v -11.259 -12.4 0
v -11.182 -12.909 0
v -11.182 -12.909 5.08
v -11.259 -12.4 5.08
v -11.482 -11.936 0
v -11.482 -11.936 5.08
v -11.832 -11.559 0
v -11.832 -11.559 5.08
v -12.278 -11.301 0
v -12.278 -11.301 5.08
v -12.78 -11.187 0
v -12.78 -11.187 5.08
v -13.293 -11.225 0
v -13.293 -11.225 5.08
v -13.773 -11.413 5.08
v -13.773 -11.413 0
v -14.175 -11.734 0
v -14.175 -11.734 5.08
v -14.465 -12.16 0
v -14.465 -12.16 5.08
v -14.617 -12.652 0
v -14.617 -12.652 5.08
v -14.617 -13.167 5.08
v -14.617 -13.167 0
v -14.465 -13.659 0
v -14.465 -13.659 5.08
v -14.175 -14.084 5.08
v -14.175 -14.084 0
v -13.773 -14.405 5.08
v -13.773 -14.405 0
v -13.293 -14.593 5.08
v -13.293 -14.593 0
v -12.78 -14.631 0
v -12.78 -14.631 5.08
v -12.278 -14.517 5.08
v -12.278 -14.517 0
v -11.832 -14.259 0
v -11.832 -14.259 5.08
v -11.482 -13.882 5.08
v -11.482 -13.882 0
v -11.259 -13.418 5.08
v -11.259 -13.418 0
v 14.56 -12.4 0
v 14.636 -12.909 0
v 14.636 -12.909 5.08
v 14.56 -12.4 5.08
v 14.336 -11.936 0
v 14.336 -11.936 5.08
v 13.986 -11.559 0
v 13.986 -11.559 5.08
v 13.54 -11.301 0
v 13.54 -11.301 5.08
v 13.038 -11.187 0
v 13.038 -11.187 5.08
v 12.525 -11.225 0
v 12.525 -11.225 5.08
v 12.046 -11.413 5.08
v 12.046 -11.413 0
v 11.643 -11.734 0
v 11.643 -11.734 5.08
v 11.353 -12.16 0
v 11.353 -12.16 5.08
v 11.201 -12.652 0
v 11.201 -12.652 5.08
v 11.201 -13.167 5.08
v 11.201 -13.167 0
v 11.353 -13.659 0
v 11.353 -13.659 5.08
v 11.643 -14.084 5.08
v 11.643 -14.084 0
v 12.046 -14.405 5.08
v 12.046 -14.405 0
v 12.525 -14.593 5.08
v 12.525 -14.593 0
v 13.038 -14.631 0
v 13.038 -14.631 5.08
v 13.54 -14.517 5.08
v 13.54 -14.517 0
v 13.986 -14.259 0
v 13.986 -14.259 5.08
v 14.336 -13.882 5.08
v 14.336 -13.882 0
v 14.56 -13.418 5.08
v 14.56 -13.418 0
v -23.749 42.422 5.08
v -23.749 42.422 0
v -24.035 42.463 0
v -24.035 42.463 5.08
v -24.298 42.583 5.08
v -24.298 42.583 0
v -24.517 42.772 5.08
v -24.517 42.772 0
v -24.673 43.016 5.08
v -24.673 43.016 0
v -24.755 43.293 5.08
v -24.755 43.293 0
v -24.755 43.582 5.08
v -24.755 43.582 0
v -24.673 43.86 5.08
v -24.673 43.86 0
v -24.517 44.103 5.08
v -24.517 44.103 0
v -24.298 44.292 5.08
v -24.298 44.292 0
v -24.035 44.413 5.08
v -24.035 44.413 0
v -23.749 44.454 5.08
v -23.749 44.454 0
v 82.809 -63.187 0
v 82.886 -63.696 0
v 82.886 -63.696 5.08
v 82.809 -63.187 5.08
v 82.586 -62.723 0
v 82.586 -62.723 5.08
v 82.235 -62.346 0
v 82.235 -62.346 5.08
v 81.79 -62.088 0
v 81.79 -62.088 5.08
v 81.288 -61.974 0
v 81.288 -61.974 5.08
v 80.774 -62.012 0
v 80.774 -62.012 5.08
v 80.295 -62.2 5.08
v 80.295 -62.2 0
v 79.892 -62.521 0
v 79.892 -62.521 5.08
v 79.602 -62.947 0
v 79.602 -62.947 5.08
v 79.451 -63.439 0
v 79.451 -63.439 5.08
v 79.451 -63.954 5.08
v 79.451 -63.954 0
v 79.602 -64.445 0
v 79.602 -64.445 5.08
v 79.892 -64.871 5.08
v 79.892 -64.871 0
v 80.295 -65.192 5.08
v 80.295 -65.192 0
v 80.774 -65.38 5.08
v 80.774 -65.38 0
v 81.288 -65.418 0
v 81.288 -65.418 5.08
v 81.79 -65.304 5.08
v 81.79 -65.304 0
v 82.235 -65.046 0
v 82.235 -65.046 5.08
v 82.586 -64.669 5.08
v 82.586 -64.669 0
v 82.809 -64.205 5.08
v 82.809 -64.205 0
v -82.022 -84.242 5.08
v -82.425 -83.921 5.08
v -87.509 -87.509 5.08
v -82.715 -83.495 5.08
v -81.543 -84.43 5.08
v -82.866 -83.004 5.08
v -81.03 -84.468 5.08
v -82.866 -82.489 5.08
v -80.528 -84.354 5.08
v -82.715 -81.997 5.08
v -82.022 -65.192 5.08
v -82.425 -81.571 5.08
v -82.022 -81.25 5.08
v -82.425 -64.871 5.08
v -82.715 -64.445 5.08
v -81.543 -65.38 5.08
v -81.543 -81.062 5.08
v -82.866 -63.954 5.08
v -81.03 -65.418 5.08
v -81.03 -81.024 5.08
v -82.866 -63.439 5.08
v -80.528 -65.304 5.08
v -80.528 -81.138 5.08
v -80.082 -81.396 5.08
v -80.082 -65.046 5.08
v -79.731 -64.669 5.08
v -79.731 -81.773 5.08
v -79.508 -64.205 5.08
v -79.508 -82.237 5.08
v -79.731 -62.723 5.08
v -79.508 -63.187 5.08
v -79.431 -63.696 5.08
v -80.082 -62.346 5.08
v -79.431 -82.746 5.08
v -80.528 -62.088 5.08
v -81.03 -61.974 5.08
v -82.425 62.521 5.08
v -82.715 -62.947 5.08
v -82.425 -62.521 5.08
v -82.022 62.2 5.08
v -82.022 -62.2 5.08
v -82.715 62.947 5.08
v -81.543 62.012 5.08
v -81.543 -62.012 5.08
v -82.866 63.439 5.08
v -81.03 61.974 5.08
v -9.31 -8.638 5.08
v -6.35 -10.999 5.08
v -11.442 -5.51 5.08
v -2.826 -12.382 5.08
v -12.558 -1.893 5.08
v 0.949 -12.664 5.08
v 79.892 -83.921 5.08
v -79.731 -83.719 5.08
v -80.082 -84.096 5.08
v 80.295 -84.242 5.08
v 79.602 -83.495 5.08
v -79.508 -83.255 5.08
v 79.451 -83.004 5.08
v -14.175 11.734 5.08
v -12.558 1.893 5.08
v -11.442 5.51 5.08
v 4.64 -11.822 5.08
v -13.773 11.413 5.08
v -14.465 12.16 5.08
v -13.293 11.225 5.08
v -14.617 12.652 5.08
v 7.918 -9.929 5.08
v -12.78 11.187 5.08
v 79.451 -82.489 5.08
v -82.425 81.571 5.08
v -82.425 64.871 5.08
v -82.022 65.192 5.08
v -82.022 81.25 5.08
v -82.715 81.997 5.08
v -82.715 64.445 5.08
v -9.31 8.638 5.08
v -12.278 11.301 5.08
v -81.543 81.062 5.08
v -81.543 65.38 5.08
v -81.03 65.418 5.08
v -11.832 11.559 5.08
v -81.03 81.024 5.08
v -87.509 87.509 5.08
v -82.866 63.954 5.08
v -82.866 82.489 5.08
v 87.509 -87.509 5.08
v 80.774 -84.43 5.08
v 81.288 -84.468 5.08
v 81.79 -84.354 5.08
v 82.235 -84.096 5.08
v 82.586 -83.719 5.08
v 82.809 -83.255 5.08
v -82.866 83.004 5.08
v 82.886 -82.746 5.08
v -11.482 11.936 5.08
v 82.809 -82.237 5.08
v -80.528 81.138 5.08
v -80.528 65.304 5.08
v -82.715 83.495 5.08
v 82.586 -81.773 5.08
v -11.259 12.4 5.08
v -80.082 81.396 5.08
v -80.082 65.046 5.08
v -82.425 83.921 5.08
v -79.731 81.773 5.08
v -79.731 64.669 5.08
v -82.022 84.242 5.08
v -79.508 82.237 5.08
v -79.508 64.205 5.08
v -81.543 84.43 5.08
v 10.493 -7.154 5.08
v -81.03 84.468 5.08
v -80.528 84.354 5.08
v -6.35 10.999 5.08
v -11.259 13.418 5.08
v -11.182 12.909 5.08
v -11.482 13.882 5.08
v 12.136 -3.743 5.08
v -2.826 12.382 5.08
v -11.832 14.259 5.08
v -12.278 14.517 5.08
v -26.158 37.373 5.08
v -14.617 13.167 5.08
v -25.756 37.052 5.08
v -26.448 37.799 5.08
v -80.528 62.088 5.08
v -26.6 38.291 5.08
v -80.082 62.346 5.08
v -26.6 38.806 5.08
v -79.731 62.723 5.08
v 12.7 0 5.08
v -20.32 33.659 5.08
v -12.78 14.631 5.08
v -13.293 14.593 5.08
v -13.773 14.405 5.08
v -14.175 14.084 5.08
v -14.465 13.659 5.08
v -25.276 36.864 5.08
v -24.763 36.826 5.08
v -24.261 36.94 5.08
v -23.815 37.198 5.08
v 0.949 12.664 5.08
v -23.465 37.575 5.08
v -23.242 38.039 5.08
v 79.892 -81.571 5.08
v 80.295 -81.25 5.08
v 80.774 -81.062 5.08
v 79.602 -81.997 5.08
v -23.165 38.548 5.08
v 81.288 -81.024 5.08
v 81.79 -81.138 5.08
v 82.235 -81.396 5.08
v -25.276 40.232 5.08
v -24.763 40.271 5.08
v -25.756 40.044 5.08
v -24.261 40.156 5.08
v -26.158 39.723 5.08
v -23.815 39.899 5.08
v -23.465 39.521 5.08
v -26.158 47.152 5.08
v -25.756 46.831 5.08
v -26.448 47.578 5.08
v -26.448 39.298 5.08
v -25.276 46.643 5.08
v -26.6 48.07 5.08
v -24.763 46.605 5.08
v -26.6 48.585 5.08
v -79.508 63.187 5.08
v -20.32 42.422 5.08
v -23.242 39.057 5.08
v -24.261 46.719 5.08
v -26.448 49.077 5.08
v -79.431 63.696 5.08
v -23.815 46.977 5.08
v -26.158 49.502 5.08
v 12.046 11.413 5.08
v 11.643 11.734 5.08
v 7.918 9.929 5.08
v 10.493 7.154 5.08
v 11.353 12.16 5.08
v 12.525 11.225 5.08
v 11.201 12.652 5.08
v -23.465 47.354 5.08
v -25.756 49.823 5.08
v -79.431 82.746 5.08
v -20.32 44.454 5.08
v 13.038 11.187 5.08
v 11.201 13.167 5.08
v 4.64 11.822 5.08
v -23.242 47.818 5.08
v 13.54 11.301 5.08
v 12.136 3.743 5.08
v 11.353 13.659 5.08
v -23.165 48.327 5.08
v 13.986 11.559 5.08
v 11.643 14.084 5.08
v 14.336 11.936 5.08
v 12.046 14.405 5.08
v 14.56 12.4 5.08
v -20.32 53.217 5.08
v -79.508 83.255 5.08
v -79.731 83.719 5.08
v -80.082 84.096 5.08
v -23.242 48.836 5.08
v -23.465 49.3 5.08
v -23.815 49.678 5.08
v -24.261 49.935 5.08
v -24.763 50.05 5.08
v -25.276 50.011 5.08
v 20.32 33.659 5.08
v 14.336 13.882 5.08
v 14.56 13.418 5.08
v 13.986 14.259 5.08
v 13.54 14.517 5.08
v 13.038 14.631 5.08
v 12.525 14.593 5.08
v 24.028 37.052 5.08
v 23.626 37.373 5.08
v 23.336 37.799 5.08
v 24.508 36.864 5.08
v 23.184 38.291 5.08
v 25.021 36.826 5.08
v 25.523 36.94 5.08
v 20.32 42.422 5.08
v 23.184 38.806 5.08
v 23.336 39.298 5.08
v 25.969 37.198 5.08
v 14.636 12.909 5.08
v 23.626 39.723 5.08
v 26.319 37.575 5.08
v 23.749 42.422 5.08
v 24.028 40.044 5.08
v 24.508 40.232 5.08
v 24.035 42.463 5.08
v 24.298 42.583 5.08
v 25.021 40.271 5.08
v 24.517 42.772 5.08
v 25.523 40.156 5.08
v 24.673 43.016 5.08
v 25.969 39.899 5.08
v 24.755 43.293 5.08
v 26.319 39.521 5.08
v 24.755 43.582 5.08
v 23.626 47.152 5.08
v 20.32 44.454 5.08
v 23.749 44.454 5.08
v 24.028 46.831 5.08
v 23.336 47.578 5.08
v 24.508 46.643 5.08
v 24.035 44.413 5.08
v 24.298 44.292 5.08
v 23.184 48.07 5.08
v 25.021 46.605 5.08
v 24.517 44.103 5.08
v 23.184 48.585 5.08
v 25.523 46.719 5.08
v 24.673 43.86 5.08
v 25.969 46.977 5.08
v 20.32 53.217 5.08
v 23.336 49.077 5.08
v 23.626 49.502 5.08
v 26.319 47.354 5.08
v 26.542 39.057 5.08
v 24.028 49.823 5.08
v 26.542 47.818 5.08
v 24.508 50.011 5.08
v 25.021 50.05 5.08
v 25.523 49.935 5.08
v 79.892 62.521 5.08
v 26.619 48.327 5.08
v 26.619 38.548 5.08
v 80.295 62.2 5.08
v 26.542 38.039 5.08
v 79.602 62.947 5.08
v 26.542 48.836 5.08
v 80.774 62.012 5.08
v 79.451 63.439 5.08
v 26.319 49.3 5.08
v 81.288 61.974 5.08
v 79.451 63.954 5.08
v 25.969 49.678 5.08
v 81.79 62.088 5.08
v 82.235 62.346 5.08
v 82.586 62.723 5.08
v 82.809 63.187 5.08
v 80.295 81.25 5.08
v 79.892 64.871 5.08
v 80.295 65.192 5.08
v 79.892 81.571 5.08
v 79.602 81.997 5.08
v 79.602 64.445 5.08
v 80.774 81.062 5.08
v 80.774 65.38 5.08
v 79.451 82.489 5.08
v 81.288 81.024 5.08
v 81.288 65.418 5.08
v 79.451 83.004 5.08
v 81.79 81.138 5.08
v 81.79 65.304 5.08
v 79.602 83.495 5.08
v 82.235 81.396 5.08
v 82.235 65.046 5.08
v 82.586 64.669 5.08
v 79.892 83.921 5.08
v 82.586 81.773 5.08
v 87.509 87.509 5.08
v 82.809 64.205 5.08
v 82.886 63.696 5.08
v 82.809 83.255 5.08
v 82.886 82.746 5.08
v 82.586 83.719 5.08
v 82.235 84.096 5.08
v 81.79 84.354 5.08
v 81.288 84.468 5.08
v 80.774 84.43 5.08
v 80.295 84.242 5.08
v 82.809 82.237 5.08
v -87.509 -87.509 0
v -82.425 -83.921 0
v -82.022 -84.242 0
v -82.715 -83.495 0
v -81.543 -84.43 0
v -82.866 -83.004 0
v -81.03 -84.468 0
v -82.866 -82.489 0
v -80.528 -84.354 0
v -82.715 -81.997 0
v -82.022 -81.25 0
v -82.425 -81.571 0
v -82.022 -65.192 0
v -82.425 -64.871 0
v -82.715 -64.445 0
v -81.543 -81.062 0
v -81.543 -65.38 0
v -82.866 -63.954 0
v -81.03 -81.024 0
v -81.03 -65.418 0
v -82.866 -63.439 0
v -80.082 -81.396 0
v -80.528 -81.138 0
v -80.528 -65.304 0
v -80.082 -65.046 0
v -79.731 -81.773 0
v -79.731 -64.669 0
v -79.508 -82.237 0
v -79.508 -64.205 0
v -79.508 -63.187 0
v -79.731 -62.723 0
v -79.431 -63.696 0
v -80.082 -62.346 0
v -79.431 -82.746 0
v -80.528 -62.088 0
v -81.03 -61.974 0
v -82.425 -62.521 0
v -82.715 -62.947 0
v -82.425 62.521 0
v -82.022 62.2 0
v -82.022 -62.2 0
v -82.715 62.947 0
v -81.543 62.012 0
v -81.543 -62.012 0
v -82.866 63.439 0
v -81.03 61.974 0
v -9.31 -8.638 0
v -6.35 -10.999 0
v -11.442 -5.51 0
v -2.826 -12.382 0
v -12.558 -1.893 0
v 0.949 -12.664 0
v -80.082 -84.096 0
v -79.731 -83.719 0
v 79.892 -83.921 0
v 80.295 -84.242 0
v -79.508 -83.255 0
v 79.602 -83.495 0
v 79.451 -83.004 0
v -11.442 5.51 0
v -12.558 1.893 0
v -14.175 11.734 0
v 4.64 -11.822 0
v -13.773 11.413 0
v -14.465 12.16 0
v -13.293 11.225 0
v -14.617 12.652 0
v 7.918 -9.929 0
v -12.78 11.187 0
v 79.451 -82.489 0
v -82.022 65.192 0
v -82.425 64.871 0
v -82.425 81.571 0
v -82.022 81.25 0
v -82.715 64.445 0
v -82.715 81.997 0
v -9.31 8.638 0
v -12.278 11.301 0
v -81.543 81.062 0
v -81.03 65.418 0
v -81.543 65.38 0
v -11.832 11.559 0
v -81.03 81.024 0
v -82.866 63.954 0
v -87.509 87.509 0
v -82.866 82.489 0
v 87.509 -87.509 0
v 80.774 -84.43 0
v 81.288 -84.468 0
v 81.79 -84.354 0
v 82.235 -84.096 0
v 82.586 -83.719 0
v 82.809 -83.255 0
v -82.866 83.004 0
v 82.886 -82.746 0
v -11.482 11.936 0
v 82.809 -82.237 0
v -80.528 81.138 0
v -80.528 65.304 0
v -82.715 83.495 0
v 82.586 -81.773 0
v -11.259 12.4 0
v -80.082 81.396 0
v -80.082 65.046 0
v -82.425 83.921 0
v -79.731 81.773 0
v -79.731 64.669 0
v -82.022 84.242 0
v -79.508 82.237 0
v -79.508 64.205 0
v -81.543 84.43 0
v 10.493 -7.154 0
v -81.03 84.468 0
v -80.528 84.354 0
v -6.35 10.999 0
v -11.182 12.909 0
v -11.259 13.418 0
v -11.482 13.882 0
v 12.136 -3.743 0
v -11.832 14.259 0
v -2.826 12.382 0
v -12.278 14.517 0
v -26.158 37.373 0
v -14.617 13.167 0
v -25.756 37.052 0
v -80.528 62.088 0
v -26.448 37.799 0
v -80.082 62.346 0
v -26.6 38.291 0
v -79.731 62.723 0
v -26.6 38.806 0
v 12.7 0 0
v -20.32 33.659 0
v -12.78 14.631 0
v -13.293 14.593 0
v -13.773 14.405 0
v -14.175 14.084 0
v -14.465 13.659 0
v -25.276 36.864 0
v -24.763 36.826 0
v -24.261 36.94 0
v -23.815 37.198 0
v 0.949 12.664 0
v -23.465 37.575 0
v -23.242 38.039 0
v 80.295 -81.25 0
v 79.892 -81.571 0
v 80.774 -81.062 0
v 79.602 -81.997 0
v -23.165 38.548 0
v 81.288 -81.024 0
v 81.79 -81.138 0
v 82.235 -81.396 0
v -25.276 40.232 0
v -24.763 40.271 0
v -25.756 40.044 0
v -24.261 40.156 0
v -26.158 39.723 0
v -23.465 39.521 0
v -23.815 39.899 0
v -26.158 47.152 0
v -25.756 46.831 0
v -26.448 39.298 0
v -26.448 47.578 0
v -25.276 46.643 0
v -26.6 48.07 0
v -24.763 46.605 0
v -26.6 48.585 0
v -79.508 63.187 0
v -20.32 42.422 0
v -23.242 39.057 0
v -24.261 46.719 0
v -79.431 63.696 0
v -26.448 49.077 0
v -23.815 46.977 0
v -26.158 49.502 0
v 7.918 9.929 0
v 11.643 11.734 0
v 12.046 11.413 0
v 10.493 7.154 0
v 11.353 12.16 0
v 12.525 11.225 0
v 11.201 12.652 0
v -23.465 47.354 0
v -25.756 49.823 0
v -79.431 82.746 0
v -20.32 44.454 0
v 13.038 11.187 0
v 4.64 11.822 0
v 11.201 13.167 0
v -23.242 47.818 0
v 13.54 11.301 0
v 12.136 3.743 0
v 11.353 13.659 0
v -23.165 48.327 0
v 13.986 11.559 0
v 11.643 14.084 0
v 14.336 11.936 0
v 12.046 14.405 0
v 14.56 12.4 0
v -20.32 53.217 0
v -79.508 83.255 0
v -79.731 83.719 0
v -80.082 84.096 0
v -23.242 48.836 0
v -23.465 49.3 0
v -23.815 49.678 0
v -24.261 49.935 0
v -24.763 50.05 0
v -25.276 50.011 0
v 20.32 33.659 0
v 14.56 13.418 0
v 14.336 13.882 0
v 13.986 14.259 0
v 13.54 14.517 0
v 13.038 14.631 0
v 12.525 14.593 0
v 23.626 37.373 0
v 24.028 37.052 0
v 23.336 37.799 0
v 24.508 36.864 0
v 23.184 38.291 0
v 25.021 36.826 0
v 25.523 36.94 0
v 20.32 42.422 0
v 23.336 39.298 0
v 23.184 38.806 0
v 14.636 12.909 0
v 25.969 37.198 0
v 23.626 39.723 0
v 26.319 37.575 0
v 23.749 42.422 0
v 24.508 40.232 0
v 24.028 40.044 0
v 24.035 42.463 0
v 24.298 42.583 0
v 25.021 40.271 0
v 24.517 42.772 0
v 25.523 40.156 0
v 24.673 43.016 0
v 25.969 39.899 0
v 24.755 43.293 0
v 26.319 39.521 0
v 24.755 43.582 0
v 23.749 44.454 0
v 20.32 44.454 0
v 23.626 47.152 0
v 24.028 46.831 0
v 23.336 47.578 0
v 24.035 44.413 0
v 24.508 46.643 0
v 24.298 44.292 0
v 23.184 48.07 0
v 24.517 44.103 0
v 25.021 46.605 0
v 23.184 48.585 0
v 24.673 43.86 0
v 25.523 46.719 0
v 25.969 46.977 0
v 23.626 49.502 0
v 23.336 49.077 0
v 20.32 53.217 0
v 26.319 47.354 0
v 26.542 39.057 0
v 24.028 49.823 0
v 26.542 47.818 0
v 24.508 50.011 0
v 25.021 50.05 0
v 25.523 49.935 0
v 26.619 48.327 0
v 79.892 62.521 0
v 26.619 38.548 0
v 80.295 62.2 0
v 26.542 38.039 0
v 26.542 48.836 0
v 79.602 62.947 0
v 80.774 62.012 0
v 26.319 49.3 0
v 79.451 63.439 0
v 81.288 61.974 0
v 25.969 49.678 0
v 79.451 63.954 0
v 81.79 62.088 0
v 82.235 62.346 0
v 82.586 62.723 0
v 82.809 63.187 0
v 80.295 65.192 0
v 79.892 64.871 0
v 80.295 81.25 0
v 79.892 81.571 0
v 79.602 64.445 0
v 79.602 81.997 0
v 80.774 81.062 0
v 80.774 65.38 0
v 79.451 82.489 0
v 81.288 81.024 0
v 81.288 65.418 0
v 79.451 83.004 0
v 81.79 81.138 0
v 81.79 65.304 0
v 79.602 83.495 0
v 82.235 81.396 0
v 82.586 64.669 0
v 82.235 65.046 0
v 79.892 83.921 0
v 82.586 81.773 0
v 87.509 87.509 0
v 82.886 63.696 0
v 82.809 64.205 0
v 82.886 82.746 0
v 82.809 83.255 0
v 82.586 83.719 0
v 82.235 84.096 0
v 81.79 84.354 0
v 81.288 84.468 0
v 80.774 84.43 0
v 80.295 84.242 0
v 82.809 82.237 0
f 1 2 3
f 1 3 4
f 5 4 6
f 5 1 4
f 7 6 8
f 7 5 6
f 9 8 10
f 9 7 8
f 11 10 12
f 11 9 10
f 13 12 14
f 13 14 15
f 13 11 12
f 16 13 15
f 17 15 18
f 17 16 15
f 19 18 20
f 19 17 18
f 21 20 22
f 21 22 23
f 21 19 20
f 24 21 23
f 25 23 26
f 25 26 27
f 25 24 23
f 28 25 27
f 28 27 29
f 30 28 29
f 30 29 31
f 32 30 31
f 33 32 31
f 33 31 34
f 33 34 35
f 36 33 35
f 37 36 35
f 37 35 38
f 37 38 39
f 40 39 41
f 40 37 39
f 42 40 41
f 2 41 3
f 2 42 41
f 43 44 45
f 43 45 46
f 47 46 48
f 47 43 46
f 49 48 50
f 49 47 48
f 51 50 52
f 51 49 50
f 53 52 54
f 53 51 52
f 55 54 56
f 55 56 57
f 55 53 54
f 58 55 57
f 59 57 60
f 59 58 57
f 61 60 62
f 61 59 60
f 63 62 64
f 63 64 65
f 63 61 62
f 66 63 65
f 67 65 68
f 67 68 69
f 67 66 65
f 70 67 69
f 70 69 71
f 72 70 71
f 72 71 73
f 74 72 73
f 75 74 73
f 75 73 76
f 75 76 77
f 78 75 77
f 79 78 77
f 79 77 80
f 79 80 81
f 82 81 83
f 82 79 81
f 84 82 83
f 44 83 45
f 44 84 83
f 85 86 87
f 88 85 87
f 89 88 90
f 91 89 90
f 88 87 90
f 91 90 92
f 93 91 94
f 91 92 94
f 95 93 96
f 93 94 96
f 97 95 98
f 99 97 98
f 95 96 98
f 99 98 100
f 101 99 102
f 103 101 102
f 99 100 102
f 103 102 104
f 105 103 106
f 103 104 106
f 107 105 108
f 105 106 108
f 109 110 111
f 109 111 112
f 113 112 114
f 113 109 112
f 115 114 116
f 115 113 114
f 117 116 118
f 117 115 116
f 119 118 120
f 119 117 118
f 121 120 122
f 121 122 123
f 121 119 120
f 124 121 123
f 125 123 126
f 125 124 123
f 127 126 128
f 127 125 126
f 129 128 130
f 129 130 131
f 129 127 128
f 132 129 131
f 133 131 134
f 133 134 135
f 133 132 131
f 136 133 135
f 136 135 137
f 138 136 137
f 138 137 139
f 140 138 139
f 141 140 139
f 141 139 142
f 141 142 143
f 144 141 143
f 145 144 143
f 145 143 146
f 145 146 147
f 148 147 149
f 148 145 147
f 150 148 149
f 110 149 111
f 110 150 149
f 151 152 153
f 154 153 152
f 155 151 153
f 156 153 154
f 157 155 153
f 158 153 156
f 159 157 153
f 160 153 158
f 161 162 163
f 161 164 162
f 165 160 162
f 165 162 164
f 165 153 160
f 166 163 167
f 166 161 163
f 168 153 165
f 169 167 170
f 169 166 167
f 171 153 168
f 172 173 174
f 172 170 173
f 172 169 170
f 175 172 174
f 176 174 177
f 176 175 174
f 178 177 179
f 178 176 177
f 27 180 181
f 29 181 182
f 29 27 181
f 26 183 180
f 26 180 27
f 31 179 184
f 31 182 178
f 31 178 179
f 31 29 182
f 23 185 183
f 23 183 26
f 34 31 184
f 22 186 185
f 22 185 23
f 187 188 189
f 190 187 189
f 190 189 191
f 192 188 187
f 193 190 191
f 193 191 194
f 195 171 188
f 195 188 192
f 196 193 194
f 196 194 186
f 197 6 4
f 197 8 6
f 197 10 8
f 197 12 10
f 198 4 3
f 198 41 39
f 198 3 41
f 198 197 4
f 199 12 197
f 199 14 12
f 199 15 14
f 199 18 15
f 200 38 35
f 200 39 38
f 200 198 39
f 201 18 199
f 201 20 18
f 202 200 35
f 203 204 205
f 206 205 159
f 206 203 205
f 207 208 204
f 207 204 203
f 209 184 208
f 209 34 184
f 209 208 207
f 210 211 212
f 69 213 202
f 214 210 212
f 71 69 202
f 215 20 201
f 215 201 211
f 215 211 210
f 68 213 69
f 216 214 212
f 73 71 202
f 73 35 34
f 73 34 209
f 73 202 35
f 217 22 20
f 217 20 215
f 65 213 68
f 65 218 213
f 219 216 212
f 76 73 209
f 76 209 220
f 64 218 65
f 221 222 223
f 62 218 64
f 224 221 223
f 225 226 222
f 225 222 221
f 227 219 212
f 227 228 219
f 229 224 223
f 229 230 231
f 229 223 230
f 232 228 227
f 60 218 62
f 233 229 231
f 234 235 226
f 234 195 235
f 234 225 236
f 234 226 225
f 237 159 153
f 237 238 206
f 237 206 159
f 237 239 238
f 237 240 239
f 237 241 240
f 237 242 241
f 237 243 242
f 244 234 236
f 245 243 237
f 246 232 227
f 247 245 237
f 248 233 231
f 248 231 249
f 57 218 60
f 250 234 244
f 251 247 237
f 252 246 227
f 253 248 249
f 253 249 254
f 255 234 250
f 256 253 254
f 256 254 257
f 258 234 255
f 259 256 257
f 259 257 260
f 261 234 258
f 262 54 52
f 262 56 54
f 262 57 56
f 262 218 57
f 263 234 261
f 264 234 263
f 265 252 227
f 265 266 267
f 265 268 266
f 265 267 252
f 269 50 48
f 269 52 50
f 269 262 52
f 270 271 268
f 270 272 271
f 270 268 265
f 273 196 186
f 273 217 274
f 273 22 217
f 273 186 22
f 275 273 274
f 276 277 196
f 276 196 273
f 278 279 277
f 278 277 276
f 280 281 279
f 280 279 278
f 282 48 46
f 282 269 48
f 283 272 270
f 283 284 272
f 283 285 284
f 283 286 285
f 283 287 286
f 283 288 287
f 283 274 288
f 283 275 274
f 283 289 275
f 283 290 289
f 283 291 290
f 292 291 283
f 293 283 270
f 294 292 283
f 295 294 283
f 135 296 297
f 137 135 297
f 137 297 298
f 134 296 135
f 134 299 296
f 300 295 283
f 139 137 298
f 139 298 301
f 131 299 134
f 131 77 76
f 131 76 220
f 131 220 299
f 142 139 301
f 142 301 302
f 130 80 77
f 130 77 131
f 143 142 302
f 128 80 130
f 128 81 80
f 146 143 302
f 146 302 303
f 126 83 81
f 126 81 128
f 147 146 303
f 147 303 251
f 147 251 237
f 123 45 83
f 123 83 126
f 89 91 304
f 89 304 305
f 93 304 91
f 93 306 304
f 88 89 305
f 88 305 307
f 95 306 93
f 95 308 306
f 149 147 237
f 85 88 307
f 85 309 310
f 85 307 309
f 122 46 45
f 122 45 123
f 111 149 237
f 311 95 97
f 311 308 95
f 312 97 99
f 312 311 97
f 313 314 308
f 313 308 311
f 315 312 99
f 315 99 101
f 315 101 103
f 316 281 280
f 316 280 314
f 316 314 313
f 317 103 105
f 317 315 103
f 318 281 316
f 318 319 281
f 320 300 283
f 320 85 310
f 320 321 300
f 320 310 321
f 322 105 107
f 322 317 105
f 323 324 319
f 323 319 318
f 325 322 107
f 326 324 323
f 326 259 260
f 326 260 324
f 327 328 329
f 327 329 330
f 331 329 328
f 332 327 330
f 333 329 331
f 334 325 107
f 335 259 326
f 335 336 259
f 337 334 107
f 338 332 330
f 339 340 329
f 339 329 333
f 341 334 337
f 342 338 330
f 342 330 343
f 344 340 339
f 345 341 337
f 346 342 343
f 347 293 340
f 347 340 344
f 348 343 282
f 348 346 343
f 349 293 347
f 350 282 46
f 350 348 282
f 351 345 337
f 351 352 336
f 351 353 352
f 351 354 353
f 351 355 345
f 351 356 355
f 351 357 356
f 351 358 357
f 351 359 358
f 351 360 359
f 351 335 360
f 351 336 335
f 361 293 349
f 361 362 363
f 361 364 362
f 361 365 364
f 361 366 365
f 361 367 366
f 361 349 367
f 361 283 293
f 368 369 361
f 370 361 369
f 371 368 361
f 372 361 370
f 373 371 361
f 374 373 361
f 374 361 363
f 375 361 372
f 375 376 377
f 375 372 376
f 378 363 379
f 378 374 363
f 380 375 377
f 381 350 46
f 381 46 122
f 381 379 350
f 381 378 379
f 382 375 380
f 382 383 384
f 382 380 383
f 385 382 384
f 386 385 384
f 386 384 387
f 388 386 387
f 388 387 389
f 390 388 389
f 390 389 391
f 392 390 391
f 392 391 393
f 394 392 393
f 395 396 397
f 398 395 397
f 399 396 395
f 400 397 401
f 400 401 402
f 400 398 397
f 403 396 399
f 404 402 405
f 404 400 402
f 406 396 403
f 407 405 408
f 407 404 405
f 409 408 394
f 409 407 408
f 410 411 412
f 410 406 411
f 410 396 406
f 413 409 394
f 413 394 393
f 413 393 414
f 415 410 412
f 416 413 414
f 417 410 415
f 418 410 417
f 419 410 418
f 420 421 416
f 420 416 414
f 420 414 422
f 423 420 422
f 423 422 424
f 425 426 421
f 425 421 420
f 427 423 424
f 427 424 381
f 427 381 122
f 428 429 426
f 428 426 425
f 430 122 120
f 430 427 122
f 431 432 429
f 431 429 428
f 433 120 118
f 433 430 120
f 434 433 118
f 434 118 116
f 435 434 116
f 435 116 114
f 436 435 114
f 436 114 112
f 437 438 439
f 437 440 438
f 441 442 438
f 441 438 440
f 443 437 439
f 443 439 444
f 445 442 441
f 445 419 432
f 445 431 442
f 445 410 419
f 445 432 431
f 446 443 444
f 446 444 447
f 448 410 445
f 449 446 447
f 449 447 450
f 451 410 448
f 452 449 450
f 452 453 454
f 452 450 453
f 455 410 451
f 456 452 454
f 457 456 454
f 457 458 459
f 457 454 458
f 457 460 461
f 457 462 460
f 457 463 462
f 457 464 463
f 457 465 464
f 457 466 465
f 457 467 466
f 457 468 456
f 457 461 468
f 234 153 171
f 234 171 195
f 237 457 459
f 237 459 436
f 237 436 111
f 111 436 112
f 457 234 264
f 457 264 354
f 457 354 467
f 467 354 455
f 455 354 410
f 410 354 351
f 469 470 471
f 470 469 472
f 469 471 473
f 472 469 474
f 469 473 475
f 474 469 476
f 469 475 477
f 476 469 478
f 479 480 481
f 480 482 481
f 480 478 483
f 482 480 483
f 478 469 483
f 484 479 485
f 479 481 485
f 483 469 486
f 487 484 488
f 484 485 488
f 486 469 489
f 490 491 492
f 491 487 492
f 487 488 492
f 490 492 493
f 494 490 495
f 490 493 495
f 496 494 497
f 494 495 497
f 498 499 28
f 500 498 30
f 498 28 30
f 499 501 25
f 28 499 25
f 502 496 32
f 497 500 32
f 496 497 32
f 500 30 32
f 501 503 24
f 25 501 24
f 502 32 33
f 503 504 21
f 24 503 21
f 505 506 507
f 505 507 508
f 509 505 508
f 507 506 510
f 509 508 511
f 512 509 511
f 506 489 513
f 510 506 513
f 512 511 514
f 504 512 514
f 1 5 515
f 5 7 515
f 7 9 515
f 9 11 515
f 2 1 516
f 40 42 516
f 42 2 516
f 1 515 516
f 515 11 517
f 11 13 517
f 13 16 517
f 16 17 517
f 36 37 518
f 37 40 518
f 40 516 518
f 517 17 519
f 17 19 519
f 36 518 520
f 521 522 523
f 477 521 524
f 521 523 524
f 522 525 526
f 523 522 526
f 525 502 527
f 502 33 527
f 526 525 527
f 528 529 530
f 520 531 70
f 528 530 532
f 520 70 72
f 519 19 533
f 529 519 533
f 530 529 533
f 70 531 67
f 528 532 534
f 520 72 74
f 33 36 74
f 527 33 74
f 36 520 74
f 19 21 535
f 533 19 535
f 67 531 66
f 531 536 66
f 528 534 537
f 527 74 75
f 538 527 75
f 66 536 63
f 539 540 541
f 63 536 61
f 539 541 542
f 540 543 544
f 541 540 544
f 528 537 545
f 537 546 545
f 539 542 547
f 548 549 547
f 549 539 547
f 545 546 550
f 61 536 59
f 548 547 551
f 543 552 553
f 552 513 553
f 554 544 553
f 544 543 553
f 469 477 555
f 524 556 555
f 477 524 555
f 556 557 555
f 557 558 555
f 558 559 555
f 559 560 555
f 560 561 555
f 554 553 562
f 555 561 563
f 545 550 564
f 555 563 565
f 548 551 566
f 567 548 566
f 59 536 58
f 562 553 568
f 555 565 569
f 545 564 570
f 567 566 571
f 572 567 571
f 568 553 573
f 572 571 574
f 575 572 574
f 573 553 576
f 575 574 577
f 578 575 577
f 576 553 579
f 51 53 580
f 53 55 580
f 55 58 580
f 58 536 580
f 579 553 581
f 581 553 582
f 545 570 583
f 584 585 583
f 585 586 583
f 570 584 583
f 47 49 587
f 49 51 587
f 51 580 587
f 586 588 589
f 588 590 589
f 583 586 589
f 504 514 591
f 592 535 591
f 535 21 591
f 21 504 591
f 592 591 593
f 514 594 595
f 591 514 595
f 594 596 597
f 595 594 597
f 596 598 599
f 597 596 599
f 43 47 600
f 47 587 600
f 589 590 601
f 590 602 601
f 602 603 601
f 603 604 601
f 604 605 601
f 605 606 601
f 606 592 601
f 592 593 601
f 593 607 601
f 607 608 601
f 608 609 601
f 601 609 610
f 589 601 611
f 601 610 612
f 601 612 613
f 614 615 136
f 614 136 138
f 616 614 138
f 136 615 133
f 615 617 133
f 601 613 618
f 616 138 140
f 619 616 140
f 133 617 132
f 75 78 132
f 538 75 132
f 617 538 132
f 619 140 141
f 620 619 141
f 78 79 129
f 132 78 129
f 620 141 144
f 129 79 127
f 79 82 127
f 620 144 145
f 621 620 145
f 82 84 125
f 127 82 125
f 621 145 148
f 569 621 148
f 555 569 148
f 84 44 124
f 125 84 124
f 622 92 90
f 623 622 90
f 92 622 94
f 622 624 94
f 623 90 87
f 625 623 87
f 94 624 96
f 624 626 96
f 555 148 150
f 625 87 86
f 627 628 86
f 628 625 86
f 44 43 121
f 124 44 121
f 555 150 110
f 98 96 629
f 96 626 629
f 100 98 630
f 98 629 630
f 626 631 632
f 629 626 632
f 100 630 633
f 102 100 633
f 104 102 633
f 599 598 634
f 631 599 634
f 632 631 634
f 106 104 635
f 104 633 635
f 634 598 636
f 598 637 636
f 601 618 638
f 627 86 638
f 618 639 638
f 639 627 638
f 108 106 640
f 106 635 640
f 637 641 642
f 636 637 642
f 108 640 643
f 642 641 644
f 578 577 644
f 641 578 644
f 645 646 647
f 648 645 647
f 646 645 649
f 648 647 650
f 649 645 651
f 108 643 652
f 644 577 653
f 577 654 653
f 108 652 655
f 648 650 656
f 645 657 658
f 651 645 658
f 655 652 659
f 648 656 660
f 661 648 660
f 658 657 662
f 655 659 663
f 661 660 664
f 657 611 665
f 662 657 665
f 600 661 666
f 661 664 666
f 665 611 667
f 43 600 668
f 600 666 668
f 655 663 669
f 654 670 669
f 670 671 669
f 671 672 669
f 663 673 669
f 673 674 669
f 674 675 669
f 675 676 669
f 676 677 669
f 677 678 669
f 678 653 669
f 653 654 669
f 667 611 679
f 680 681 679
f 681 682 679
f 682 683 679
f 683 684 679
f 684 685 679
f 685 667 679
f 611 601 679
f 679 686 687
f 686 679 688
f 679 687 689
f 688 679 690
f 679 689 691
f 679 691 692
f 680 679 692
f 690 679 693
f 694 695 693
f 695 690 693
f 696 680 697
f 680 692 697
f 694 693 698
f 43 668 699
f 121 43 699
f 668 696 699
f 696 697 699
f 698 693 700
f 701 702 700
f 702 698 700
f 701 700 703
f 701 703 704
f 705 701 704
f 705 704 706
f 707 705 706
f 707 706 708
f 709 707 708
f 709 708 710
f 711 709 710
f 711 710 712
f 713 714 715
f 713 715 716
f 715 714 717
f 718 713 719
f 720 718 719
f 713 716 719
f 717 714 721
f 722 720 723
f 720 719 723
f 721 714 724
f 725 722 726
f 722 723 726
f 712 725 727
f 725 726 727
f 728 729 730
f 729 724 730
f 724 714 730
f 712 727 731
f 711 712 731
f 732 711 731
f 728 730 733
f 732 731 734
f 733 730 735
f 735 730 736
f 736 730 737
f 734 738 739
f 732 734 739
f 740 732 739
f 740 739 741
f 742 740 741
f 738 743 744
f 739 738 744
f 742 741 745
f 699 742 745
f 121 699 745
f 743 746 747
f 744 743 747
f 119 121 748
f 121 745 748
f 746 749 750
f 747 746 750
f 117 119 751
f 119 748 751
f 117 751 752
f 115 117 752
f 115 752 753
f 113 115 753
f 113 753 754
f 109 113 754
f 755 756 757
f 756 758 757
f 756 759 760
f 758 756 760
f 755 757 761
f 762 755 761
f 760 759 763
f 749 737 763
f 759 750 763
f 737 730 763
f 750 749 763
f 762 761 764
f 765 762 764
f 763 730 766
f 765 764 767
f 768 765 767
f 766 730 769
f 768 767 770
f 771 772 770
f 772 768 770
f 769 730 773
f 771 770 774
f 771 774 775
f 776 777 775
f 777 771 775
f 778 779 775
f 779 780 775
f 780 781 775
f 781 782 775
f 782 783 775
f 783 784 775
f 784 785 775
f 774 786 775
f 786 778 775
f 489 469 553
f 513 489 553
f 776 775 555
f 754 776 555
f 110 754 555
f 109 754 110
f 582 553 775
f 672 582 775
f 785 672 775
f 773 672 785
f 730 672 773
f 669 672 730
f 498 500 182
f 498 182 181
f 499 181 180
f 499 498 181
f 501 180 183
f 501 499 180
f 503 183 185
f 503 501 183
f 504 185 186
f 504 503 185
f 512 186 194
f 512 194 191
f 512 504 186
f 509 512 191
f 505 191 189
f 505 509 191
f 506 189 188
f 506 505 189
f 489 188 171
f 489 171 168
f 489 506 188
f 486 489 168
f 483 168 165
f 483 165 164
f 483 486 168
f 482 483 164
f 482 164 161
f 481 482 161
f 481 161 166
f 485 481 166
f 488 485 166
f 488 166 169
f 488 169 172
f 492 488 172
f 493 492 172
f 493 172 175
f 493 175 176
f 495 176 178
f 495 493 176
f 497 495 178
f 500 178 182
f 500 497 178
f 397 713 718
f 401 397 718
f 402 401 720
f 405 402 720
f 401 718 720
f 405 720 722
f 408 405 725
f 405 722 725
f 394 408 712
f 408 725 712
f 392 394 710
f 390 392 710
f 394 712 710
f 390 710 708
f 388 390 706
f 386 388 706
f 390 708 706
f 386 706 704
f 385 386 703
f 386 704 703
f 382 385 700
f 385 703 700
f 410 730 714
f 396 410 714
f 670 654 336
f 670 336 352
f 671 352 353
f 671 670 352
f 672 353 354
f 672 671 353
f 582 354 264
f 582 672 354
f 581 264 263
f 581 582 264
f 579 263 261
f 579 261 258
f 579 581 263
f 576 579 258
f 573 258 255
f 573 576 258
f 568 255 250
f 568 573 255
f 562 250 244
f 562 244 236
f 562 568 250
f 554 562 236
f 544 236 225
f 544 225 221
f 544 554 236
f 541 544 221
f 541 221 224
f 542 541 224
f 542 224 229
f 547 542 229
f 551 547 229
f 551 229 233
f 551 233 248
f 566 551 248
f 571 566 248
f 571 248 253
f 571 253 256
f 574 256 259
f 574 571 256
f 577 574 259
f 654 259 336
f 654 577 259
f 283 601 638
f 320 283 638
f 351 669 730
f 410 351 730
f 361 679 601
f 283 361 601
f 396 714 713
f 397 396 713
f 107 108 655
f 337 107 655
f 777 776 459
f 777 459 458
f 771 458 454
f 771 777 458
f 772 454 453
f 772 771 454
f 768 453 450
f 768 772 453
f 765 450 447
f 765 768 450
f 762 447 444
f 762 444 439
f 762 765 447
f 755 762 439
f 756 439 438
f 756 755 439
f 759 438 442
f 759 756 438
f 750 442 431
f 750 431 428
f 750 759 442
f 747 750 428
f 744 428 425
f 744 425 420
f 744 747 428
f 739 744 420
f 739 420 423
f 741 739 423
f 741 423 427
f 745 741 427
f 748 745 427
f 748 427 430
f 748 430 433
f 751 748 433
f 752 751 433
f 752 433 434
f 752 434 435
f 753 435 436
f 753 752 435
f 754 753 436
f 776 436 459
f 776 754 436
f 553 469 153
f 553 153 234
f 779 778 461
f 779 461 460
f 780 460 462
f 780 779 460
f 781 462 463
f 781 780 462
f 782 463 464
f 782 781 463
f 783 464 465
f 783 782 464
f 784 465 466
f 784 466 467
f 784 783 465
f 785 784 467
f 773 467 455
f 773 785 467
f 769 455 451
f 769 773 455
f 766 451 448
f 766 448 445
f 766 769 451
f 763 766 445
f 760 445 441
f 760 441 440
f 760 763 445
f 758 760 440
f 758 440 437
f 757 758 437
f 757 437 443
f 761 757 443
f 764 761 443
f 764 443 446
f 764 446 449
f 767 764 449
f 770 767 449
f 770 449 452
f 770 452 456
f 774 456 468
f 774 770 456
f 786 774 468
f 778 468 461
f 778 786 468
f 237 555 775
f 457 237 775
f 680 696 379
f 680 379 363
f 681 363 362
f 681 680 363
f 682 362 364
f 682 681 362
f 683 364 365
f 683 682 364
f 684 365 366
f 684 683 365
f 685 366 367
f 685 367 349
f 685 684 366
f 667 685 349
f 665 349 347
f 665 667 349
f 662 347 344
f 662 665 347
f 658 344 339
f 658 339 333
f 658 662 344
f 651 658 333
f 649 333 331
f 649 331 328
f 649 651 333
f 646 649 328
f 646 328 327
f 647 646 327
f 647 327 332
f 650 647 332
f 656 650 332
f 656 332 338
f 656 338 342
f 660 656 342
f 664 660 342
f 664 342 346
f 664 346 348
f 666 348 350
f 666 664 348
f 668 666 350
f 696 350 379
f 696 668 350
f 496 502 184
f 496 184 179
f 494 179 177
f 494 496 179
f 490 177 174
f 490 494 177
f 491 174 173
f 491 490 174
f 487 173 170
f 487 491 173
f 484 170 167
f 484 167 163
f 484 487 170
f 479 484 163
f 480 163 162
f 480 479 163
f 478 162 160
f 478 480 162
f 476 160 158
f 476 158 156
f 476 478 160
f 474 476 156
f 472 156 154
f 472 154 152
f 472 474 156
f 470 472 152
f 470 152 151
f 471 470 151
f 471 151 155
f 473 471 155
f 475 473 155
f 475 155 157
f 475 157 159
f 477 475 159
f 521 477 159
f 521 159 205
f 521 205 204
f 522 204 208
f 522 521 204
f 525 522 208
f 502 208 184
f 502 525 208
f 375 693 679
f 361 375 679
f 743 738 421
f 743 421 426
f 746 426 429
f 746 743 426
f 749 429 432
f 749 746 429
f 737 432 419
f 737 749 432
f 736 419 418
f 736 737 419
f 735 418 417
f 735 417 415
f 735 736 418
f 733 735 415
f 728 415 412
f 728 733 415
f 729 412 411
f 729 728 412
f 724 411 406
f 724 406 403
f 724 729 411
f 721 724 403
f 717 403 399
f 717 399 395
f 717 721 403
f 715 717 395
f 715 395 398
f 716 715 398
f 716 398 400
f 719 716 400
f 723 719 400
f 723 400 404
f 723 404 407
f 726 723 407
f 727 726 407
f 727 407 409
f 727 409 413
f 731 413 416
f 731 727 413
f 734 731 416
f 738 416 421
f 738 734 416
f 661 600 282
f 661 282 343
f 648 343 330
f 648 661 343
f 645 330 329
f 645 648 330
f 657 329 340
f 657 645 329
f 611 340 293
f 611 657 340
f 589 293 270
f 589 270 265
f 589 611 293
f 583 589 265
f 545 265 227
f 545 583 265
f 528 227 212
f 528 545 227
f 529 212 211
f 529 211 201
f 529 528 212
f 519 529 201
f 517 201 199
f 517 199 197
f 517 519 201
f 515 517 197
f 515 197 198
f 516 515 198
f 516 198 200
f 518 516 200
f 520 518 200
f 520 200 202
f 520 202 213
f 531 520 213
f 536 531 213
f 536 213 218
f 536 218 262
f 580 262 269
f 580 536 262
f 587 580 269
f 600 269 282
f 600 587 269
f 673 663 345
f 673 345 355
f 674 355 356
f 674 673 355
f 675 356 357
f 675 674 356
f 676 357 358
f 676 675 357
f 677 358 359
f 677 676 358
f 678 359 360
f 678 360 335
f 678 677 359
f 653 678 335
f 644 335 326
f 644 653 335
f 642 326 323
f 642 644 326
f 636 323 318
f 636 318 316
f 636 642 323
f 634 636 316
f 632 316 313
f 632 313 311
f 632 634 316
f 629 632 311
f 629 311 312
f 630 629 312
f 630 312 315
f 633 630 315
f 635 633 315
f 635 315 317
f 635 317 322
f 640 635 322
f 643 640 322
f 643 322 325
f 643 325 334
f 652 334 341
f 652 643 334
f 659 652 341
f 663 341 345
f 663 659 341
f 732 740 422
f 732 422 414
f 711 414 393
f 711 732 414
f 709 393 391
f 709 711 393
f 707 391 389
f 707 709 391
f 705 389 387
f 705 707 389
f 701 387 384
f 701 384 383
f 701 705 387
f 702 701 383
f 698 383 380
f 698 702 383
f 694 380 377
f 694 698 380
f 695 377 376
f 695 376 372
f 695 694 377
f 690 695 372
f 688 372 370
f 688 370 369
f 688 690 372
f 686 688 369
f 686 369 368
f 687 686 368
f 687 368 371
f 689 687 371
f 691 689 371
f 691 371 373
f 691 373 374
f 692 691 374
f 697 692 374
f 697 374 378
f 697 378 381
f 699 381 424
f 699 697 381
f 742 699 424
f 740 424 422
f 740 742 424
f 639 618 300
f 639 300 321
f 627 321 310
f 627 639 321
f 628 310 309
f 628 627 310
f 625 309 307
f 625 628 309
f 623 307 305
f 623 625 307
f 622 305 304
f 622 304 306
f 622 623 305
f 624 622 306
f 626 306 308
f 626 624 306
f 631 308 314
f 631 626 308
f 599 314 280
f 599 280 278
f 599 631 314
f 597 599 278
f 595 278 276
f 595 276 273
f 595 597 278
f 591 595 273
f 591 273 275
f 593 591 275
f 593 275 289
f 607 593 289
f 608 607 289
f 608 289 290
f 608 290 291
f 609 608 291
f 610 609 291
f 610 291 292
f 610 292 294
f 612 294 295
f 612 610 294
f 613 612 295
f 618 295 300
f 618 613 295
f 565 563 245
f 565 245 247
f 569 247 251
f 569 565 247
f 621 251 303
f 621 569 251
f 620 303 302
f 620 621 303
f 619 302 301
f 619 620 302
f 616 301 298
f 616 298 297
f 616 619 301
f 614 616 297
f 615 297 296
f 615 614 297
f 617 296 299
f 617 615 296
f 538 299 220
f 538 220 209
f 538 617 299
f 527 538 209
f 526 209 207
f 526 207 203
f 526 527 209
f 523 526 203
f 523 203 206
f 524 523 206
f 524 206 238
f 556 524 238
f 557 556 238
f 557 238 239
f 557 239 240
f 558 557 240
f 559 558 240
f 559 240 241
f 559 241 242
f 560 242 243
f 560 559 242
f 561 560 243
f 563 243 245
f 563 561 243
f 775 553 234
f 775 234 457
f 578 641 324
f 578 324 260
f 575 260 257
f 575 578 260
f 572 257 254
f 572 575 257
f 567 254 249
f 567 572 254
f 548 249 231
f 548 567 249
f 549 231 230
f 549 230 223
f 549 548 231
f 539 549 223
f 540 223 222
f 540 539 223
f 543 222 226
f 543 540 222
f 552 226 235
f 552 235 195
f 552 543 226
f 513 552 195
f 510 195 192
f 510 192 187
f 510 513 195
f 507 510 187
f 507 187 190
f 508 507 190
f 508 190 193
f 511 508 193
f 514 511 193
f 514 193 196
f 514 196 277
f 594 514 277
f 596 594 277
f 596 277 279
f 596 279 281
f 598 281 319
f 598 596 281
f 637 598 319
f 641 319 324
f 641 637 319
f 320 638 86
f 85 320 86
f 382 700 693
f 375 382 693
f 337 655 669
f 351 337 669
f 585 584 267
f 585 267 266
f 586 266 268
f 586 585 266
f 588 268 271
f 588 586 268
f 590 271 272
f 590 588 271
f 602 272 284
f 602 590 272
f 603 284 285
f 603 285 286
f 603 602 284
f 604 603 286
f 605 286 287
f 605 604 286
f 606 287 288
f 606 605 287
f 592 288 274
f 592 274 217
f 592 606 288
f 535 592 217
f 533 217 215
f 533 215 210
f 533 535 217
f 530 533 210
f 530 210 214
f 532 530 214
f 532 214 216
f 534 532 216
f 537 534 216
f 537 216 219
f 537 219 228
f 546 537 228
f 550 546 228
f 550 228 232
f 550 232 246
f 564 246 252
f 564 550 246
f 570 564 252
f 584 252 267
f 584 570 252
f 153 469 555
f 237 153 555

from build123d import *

# Parameters (mm, degrees)
F0_W     = 175.017152
F0_H     = 175.017152
F0_R     = 1.7272
F0_R_2   = 12.7
F1_DEPTH = 5.08


with BuildPart() as f1:
    # F0 (on Top) → F1 (new body)
    with BuildSketch(Plane.XY):
        Rectangle(F0_W, F0_H)
        with Locations((-81.158576, -82.746076)):
            Circle(F0_R, mode=Mode.SUBTRACT)
        with Locations((-81.158576, -63.696076)):
            Circle(F0_R, mode=Mode.SUBTRACT)
        with Locations((-12.909118, -12.909118)):
            Circle(F0_R, mode=Mode.SUBTRACT)
        with Locations((81.158576, -82.746076)):
            Circle(F0_R, mode=Mode.SUBTRACT)
        with Locations((81.158576, -63.696076)):
            Circle(F0_R, mode=Mode.SUBTRACT)
        with Locations((12.909118, -12.909118)):
            Circle(F0_R, mode=Mode.SUBTRACT)
        with Locations((-12.909118, 12.909118)):
            Circle(F0_R, mode=Mode.SUBTRACT)
        with Locations((-24.892, 38.548238)):
            Circle(F0_R, mode=Mode.SUBTRACT)
        with Locations((-81.158576, 63.696076)):
            Circle(F0_R, mode=Mode.SUBTRACT)
        with Locations((-81.158576, 82.746076)):
            Circle(F0_R, mode=Mode.SUBTRACT)
        with Locations((-24.892, 48.327238)):
            Circle(F0_R, mode=Mode.SUBTRACT)
        Circle(F0_R_2, mode=Mode.SUBTRACT)
        with Locations((12.909118, 12.909118)):
            Circle(F0_R, mode=Mode.SUBTRACT)
        with BuildLine():
            Line((-20.32, 44.453738), (-20.32, 53.216738))
            Line((-20.32, 53.216738), (20.32, 53.216738))
            Line((20.32, 53.216738), (20.32, 44.453738))
            Line((20.32, 44.453738), (23.749, 44.453738))
            ThreePointArc((23.749, 44.453738), (24.765, 43.437738), (23.749, 42.421738))
            Line((23.749, 42.421738), (20.32, 42.421738))
            Line((20.32, 42.421738), (20.32, 33.658738))
            Line((20.32, 33.658738), (-20.32, 33.658738))
            Line((-20.32, 33.658738), (-20.32, 42.421738))
            Line((-20.32, 42.421738), (-23.749, 42.421738))
            ThreePointArc((-23.749, 42.421738), (-24.765, 43.437738), (-23.749, 44.453738))
            Line((-23.749, 44.453738), (-20.32, 44.453738))
        make_face(mode=Mode.SUBTRACT)
        with Locations((24.892, 38.548238)):
            Circle(F0_R, mode=Mode.SUBTRACT)
        with Locations((24.892, 48.327238)):
            Circle(F0_R, mode=Mode.SUBTRACT)
        with Locations((81.158576, 63.696076)):
            Circle(F0_R, mode=Mode.SUBTRACT)
        with Locations((81.158576, 82.746076)):
            Circle(F0_R, mode=Mode.SUBTRACT)
    extrude(amount=F1_DEPTH)


solid = f1.part
